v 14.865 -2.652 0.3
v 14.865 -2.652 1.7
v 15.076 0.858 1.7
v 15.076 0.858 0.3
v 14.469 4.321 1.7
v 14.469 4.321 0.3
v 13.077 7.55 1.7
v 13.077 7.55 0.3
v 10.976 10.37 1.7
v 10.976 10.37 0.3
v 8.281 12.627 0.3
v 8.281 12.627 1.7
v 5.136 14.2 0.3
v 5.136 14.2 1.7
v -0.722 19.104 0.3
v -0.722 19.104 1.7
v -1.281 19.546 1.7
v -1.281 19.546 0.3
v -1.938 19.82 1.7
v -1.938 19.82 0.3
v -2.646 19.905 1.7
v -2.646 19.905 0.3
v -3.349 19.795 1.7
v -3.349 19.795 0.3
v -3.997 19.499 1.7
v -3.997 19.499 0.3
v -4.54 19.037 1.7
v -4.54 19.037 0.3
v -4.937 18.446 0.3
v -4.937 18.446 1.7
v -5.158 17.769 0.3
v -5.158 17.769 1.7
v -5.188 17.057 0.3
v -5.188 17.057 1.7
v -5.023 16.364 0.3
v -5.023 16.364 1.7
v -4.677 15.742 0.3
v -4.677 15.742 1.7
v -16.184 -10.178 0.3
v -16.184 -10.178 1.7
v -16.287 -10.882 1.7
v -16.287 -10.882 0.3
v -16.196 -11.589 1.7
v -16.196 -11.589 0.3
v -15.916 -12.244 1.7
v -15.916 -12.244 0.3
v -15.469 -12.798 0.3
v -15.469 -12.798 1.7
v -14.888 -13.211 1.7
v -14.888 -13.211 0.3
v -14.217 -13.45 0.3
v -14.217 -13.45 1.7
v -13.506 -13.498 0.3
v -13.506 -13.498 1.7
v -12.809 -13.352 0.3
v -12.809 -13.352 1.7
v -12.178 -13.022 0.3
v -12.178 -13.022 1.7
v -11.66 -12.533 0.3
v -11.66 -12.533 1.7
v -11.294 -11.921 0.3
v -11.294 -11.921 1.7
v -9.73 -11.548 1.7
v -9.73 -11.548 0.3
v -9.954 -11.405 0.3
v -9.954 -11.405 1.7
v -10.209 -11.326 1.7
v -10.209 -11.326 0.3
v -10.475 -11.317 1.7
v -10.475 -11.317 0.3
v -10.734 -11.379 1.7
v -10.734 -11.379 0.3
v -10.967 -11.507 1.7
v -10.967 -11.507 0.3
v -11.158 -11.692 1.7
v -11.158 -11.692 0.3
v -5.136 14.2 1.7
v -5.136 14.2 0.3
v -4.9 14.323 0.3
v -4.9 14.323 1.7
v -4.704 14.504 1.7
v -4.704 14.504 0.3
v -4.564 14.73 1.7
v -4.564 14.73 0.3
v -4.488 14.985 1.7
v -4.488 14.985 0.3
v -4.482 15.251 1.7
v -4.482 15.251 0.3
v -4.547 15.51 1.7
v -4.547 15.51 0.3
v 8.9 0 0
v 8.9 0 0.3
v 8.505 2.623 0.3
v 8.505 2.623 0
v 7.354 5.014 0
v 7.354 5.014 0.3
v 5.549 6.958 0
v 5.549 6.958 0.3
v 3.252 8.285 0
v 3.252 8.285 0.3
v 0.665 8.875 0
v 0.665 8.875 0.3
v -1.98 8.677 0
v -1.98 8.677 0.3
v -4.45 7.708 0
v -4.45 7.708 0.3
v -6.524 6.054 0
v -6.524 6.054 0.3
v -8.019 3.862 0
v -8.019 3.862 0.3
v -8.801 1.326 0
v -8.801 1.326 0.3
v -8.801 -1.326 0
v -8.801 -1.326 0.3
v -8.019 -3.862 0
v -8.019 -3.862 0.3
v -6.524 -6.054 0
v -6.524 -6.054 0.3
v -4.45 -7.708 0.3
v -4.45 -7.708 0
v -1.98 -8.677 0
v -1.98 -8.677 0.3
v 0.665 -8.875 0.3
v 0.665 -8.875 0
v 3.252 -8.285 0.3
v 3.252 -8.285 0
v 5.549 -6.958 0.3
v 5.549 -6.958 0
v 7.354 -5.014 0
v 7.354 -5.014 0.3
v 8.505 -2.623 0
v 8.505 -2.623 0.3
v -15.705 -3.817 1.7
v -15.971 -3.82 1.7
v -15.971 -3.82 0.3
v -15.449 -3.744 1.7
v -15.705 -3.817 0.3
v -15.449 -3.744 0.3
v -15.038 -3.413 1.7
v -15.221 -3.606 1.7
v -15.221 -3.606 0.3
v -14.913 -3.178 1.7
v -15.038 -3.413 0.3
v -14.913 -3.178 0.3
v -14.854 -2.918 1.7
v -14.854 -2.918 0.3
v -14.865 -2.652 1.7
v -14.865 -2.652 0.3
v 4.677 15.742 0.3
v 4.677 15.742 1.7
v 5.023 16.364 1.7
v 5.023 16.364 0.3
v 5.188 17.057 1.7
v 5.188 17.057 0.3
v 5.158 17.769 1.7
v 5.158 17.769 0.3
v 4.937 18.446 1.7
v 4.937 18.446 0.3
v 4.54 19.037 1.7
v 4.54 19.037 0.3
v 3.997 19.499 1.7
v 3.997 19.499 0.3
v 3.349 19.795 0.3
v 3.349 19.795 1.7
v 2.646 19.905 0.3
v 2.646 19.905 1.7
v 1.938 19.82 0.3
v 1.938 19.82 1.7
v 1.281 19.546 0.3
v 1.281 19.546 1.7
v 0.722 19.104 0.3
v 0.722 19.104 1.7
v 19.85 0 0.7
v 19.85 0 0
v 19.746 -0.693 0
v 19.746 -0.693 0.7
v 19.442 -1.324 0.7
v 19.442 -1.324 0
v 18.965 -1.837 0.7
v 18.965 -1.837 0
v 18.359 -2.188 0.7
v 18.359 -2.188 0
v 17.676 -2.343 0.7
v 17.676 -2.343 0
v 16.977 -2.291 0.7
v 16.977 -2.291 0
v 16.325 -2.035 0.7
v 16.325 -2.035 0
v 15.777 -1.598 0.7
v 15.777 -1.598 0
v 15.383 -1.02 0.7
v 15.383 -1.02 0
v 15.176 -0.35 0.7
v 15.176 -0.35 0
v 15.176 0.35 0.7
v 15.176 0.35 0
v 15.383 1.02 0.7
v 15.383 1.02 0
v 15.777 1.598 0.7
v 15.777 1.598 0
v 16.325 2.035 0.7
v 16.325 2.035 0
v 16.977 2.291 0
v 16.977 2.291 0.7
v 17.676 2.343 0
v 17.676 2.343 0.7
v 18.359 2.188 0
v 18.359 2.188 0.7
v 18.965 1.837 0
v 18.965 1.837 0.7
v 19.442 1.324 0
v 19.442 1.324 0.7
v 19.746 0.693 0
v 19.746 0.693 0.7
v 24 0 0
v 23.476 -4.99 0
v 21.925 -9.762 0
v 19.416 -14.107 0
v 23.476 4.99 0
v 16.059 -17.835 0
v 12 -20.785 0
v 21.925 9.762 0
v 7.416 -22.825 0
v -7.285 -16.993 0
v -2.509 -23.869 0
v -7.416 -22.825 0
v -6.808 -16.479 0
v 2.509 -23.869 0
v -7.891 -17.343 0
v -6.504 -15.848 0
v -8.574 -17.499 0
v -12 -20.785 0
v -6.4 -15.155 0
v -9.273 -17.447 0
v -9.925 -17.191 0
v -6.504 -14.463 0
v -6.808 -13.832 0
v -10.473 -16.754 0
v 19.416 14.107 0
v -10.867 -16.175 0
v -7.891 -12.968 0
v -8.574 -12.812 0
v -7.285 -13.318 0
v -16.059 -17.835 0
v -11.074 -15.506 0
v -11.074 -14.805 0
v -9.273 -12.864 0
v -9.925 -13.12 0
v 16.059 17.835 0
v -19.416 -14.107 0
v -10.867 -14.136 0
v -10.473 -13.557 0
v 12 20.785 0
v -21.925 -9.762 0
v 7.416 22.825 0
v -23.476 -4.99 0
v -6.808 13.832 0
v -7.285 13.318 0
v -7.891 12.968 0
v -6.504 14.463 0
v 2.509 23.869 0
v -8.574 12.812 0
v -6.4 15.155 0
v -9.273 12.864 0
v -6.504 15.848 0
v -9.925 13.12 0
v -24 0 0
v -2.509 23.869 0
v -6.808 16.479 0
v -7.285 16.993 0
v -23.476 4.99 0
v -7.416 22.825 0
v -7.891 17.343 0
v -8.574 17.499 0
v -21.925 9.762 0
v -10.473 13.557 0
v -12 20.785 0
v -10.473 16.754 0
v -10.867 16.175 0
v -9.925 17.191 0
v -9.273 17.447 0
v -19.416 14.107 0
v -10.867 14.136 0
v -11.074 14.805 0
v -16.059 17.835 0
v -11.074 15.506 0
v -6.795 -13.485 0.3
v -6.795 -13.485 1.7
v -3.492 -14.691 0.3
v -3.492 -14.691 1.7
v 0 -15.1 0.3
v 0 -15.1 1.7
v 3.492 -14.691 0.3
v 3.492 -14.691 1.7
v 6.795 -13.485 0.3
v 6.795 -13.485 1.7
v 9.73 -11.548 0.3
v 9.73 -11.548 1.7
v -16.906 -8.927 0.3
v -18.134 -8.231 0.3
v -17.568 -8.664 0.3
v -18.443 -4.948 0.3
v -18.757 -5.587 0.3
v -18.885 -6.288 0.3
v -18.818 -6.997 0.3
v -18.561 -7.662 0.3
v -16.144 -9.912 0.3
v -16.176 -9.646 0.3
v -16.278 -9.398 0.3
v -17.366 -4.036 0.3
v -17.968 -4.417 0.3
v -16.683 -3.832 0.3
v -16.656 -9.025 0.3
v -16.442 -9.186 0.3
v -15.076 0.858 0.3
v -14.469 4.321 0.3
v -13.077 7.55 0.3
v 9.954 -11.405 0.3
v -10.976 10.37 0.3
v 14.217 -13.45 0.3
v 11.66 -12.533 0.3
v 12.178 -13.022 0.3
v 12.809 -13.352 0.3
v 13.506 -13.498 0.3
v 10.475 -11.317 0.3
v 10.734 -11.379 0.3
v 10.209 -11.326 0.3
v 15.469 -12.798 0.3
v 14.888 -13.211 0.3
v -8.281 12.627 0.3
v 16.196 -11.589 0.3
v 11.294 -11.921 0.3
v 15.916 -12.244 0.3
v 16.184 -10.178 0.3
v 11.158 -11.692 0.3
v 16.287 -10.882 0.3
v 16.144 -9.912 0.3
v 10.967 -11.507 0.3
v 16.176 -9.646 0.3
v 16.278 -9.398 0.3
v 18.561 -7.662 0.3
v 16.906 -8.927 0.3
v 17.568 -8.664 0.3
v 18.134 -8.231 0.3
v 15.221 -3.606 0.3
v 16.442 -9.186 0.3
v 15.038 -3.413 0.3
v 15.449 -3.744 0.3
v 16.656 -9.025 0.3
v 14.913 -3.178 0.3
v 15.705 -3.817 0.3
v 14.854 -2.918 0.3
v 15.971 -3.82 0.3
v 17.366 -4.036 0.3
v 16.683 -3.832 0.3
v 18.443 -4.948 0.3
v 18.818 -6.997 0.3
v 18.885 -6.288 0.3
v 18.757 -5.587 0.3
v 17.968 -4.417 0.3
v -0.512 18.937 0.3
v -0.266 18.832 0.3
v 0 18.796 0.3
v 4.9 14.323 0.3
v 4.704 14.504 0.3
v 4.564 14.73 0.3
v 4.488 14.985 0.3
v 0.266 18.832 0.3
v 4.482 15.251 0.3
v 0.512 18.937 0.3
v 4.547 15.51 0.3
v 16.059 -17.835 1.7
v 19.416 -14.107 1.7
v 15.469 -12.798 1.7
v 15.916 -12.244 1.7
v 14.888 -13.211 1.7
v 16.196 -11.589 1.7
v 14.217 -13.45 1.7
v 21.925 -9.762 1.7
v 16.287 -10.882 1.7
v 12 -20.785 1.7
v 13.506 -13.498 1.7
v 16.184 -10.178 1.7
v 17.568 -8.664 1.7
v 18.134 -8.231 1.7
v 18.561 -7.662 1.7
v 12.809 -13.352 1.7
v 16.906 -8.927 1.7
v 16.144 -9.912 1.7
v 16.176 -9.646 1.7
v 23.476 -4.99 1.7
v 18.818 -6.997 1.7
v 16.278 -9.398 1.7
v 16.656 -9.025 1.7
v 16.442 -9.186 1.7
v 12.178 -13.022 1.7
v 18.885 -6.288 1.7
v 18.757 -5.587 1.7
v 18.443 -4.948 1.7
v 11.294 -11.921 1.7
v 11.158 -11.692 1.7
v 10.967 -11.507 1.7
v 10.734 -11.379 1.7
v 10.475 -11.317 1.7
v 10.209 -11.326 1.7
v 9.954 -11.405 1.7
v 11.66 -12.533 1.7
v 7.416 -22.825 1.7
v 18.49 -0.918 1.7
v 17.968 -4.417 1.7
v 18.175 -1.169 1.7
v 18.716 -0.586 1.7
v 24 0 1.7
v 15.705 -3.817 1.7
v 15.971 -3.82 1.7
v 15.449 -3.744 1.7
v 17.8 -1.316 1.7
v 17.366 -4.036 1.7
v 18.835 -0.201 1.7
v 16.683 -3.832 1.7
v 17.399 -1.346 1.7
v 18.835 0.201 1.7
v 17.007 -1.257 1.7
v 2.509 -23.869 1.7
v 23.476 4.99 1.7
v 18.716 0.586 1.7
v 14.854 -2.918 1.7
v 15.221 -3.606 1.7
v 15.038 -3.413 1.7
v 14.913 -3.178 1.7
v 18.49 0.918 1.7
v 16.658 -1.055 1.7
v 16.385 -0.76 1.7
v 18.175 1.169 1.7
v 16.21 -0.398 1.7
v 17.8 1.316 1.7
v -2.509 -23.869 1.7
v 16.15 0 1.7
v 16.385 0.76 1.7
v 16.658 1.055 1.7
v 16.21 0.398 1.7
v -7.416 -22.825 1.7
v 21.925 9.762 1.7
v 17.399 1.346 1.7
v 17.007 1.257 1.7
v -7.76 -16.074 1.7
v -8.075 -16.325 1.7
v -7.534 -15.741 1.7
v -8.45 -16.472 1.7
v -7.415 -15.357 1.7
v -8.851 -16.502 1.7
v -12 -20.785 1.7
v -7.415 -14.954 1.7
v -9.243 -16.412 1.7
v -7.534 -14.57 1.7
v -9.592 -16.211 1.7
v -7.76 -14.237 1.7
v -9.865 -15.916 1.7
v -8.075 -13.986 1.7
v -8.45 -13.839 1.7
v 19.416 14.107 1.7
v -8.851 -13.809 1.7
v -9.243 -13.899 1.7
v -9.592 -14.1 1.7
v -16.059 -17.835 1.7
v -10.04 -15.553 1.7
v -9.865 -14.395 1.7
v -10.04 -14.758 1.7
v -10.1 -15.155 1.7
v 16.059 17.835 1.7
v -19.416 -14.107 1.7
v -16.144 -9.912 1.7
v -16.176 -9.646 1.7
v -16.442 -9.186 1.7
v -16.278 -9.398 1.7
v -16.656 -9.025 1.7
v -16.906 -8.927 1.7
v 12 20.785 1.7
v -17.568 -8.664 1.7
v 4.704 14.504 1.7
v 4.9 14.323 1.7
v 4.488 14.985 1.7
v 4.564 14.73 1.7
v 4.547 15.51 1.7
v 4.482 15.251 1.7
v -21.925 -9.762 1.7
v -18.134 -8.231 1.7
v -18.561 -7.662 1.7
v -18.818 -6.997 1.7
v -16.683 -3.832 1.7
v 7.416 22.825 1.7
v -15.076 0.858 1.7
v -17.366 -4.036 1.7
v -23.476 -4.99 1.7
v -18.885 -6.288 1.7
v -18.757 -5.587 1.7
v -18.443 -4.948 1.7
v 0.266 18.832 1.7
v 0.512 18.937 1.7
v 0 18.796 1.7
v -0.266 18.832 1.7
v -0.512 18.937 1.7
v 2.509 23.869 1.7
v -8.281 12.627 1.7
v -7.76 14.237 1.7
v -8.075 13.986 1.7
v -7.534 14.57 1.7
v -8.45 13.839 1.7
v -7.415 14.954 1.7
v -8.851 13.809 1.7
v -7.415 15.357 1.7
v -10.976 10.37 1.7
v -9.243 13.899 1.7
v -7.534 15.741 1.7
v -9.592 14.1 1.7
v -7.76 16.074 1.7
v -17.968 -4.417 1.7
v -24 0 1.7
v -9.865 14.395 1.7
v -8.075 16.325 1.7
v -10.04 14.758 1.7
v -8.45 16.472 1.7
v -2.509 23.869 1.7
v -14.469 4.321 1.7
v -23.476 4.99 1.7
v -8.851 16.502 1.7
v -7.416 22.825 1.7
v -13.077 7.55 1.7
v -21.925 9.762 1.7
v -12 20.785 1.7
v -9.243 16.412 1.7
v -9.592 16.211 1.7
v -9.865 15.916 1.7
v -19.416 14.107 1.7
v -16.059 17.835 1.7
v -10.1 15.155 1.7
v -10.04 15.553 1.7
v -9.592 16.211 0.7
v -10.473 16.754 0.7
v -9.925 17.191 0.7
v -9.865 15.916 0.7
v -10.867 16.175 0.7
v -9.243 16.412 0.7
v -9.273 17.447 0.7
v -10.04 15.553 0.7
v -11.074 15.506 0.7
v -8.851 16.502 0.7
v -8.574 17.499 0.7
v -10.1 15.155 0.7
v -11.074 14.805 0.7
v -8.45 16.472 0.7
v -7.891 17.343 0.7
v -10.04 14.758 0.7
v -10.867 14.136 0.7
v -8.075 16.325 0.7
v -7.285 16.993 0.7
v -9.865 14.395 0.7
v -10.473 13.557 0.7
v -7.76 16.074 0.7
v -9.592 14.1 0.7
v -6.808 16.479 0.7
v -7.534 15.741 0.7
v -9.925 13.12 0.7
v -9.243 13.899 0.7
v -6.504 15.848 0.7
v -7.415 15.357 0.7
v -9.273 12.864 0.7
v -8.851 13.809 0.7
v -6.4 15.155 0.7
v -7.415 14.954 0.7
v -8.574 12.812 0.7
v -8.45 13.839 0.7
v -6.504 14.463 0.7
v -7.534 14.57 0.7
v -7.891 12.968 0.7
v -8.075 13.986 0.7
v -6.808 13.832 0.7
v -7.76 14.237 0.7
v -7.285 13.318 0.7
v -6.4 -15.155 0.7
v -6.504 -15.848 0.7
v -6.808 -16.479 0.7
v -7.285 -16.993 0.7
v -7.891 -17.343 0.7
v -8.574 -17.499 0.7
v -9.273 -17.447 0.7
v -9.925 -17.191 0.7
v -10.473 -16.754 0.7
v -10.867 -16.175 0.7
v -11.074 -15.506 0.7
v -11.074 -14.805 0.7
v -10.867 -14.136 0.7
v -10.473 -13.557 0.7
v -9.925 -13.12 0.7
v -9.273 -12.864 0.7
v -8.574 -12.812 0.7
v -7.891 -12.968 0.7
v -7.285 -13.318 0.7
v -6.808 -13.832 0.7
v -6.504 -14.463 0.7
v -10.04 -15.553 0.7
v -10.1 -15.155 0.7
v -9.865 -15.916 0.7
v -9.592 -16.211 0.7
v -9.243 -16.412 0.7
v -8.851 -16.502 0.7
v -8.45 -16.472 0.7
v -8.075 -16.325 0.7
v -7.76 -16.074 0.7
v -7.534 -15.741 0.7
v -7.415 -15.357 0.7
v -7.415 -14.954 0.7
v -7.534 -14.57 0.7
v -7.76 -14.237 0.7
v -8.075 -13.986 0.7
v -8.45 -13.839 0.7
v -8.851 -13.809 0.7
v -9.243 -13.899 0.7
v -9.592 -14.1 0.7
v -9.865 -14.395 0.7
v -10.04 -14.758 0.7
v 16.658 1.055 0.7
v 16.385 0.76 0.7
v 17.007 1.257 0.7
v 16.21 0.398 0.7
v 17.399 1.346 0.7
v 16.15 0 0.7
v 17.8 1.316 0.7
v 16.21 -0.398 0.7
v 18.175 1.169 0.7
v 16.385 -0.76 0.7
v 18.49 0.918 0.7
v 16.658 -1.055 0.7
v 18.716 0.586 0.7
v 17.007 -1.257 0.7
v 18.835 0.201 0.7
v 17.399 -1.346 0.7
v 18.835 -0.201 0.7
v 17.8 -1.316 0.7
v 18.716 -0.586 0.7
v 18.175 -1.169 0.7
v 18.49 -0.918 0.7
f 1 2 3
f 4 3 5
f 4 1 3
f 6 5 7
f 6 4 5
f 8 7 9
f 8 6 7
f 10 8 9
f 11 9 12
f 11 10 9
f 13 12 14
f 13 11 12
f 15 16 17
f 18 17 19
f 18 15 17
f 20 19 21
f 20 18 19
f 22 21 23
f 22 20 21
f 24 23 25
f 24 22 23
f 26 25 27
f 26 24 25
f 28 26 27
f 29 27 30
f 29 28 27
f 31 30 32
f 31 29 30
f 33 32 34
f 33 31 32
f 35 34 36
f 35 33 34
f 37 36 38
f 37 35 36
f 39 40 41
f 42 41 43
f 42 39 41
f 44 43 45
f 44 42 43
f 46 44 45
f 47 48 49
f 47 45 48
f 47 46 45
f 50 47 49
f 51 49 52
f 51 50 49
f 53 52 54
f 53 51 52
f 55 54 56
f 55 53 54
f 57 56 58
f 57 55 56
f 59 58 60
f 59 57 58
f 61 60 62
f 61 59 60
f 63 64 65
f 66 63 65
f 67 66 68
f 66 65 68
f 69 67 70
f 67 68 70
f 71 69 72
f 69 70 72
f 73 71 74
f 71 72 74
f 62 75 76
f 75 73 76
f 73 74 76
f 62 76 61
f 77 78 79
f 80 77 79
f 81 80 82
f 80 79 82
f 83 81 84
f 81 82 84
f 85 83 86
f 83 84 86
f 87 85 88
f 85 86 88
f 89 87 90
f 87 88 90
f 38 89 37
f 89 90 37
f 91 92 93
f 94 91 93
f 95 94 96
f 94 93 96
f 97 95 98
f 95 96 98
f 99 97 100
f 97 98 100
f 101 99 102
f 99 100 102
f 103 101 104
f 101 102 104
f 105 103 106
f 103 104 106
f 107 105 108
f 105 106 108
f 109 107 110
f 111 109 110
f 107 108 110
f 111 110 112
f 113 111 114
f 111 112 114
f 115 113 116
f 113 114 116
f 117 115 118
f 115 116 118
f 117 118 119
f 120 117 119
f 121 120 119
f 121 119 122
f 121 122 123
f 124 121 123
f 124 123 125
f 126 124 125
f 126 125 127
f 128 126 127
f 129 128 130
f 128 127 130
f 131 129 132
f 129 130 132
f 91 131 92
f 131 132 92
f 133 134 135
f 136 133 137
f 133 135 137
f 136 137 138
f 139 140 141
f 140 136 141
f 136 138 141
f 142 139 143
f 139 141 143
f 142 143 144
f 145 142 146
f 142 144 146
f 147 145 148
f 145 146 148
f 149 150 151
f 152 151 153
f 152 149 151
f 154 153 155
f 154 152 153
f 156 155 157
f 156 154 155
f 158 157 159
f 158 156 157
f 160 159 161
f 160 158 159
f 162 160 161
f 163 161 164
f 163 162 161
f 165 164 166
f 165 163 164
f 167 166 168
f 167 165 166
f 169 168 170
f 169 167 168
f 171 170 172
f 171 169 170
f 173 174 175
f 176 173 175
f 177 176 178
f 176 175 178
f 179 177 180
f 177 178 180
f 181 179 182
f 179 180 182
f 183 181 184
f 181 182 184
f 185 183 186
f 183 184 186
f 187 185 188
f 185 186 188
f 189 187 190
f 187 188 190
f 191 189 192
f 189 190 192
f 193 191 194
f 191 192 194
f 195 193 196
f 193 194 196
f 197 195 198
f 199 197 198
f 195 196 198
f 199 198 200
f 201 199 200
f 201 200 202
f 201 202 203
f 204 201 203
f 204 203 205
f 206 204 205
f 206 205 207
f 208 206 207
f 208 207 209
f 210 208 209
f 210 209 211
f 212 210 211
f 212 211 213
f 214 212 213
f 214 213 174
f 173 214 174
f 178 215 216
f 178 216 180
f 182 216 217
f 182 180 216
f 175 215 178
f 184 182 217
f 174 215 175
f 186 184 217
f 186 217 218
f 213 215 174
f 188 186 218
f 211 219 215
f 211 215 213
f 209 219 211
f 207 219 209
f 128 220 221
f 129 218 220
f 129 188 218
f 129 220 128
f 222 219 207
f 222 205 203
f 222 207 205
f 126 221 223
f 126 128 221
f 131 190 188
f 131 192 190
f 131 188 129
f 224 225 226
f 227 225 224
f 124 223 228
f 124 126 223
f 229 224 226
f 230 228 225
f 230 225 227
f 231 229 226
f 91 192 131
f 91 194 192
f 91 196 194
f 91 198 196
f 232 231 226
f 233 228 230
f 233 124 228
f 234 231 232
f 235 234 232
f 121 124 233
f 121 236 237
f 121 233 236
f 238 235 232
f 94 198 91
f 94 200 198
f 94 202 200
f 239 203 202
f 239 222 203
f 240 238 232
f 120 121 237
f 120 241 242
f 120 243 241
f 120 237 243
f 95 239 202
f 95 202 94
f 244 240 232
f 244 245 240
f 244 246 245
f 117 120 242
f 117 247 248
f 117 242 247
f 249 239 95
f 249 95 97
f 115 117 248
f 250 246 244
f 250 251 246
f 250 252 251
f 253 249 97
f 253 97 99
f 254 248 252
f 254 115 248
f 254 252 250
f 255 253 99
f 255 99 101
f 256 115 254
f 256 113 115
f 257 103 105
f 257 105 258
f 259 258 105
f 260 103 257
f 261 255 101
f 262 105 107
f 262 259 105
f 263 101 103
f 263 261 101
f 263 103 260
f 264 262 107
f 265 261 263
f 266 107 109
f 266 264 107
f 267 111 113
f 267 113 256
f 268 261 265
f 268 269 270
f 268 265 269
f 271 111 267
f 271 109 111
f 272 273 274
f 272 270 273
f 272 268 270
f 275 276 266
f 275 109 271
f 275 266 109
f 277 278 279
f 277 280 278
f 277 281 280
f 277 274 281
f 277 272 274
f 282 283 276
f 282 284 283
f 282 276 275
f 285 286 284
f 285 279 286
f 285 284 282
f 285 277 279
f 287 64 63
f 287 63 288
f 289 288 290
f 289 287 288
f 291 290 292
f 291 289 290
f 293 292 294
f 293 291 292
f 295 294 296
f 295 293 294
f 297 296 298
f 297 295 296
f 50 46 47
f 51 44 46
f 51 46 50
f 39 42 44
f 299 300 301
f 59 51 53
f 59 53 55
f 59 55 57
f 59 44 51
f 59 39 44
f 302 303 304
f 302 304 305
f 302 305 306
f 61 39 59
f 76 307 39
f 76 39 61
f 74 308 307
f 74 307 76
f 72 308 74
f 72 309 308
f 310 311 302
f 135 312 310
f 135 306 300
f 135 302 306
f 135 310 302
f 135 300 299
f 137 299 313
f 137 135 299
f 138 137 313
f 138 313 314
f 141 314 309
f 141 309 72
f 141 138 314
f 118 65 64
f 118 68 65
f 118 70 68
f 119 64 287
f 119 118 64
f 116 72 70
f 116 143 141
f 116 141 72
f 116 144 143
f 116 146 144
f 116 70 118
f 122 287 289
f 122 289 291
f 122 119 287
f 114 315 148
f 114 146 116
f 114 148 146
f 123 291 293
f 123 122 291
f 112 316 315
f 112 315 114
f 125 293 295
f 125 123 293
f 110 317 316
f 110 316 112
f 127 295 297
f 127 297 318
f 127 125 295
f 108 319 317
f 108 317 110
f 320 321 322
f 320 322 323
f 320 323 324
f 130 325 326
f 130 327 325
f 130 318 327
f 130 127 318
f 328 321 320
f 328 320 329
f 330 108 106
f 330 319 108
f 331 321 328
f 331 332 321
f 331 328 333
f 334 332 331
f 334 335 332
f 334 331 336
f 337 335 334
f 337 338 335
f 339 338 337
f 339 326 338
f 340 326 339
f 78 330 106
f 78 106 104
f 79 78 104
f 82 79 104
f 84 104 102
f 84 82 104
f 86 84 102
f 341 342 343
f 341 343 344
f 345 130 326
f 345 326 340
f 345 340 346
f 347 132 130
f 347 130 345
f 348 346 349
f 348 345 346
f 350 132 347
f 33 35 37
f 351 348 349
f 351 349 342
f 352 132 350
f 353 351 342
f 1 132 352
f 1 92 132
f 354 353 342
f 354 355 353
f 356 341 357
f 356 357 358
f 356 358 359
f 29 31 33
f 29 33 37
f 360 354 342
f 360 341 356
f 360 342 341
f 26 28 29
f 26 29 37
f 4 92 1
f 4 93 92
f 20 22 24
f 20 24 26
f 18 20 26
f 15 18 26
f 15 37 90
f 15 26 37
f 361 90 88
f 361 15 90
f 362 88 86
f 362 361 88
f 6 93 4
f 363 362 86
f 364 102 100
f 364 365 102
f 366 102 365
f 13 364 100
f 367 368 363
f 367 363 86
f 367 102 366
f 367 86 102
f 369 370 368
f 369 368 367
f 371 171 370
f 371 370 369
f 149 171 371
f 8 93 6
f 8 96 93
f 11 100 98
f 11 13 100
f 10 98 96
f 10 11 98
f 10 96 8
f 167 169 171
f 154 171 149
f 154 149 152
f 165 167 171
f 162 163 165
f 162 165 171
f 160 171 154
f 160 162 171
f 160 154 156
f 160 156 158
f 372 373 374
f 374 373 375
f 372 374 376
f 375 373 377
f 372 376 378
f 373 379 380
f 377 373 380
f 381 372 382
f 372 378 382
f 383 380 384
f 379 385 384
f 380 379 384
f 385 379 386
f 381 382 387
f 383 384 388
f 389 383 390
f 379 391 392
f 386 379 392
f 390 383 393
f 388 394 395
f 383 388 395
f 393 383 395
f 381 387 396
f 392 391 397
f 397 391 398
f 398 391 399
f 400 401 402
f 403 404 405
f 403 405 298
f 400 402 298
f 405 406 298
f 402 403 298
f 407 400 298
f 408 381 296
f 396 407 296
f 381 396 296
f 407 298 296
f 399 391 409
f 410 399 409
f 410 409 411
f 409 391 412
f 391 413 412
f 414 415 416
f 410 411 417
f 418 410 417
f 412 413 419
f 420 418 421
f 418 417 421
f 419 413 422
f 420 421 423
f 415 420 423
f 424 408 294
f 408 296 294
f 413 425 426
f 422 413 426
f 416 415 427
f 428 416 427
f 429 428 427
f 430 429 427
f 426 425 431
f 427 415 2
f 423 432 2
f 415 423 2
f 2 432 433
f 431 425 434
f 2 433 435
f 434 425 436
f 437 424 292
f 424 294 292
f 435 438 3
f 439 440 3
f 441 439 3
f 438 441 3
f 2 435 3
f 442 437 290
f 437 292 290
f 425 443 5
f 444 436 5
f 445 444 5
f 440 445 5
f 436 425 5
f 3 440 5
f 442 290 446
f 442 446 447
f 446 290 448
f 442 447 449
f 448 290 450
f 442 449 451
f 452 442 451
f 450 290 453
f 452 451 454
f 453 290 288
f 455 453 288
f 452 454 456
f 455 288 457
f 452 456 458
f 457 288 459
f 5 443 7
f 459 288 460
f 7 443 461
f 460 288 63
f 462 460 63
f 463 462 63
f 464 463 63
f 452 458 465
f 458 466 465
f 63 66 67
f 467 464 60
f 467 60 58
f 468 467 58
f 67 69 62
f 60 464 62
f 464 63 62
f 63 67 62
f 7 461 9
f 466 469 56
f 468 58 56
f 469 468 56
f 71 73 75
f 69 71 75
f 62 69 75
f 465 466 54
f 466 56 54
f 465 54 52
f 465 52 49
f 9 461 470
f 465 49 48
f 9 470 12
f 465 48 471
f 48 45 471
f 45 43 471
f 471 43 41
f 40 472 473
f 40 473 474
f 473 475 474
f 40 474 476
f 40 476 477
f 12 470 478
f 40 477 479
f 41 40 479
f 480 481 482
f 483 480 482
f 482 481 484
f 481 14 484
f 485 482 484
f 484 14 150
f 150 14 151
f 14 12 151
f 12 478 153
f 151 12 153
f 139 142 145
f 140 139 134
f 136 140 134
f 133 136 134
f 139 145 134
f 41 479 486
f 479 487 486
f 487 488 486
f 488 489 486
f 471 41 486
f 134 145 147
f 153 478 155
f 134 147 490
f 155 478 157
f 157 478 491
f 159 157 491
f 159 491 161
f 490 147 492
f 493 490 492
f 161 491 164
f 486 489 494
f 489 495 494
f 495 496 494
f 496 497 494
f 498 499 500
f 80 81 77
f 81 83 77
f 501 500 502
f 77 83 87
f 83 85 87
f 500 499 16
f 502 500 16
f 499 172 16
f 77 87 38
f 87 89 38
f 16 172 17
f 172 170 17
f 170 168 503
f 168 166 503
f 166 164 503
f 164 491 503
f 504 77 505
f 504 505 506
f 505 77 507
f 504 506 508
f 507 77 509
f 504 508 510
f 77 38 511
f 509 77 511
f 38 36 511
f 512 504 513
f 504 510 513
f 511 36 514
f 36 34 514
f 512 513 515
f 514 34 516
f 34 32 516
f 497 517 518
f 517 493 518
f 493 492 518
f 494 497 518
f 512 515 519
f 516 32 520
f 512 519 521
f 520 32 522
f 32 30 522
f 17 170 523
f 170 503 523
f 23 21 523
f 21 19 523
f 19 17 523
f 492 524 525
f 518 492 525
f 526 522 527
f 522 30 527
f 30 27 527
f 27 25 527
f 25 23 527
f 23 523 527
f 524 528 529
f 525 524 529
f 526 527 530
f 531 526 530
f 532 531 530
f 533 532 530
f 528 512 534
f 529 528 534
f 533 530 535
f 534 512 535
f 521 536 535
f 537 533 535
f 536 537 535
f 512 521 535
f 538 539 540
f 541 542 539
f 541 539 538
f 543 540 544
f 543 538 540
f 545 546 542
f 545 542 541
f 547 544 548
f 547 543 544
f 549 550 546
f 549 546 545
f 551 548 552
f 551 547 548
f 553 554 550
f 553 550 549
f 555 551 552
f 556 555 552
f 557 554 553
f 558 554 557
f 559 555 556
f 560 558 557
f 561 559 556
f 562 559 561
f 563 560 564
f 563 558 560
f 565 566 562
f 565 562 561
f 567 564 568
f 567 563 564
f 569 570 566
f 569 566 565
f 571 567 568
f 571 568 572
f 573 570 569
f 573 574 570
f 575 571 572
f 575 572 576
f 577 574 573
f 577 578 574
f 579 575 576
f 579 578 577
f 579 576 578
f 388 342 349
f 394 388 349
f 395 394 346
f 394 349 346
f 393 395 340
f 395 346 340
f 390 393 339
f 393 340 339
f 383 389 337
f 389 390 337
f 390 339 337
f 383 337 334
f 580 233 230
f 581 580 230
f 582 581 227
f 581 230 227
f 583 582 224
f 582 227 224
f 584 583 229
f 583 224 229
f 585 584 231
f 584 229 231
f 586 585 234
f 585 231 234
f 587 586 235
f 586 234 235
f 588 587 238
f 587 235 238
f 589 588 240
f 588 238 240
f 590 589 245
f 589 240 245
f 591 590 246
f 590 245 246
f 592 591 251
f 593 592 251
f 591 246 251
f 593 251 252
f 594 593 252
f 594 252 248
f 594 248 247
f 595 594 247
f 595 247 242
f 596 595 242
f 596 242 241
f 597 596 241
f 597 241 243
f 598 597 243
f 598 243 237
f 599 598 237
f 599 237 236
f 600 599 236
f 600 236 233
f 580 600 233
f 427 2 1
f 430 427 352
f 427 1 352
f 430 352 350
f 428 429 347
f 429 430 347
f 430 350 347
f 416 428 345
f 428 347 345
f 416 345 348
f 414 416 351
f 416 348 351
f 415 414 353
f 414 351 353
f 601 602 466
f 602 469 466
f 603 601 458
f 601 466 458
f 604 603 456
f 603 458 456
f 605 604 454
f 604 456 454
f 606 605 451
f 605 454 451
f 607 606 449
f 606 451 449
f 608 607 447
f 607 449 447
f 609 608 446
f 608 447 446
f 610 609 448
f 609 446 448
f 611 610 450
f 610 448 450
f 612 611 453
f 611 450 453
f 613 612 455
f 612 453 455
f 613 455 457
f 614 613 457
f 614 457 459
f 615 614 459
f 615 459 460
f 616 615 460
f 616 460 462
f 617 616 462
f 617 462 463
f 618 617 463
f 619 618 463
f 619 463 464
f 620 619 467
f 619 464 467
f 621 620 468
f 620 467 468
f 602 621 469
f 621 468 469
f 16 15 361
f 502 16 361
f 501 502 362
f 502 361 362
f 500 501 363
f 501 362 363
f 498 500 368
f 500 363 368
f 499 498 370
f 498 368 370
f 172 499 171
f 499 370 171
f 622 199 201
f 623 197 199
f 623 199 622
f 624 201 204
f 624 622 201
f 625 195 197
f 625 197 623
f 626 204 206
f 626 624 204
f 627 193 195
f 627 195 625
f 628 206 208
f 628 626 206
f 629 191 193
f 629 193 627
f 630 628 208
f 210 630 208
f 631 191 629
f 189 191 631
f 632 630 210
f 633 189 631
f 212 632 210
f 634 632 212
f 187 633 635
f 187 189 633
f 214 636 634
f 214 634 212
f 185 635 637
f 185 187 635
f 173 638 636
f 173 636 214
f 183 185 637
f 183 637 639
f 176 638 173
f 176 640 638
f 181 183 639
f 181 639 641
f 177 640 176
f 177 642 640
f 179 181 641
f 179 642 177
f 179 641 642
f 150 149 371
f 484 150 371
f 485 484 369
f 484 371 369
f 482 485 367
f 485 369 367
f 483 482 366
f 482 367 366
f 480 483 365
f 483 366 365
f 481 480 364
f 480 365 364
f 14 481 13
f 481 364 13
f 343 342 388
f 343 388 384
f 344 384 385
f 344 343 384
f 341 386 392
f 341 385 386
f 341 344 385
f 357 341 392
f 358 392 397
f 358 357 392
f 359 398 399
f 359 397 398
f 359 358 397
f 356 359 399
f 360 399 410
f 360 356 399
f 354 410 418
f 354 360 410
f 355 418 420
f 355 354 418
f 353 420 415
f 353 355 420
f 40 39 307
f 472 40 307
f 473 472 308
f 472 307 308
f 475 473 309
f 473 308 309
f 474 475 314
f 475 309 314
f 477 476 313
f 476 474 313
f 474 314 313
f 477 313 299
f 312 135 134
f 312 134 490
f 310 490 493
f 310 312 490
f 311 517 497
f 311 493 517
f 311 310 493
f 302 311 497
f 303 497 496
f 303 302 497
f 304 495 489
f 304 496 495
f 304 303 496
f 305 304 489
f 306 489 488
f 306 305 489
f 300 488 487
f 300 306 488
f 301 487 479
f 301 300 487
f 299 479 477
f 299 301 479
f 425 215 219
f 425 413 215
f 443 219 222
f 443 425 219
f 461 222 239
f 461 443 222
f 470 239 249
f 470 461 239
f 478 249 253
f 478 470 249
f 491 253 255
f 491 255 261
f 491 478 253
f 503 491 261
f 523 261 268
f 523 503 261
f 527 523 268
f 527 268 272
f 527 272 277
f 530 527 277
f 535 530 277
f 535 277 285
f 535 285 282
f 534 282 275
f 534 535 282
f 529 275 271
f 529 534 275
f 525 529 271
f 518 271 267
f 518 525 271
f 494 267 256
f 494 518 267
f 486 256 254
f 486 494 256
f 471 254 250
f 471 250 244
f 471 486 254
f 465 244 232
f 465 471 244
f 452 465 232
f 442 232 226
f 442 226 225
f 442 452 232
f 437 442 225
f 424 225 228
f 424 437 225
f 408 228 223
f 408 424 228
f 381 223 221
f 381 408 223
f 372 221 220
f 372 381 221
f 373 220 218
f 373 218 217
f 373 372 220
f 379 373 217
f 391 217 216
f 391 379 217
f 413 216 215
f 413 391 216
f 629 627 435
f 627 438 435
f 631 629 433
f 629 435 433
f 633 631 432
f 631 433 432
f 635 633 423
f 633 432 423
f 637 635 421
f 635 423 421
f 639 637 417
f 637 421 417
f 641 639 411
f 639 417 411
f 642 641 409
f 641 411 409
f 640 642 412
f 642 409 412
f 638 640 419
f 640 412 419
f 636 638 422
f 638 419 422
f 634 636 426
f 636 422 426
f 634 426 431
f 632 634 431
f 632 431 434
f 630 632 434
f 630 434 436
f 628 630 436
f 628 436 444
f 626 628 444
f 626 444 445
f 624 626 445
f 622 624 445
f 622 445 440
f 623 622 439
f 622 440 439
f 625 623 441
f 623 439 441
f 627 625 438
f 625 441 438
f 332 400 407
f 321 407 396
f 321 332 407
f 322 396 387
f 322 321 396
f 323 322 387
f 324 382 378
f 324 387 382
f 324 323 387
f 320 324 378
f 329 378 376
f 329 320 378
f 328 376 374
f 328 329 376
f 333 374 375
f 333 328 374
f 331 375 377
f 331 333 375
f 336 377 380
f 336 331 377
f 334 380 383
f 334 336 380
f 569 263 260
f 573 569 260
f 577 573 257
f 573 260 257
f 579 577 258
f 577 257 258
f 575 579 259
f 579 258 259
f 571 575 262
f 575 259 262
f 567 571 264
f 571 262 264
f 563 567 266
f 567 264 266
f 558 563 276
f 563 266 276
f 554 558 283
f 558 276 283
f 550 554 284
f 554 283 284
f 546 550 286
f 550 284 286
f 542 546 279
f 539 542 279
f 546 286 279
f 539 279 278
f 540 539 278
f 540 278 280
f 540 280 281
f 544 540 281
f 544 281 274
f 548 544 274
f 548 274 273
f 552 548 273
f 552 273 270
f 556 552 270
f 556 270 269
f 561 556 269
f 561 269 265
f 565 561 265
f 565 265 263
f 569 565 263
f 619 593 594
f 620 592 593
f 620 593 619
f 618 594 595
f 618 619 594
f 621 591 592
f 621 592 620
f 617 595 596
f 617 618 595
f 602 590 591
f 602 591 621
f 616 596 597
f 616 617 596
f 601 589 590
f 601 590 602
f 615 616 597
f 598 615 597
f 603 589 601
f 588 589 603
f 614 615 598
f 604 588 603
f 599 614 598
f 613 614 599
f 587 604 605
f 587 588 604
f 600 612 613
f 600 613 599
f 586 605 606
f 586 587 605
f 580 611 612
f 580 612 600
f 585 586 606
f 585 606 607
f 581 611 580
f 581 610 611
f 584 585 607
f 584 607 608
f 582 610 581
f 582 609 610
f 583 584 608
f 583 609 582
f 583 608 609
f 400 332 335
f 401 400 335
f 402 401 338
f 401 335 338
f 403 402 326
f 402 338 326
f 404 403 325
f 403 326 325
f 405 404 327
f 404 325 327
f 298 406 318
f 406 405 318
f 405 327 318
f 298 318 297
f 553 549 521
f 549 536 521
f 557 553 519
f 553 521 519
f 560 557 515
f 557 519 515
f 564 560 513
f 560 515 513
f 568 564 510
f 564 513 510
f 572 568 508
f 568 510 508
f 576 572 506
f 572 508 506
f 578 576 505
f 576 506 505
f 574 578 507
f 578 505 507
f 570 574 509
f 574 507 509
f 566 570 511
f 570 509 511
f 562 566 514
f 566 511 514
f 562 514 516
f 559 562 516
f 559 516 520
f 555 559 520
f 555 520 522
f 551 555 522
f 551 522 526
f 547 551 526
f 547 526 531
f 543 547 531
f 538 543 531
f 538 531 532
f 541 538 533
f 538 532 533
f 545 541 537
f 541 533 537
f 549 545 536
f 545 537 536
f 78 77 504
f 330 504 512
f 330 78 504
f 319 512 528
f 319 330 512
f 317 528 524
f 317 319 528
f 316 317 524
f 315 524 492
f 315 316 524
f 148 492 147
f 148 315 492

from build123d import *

# Parameters (mm, degrees)
SKETCH_W         = 15.1
SKETCH_H         = 1.7
POCKET_DEPTH     = 5.2
HOLE_D           = 2.7
HOLE_CBORE_D     = 4.7
HOLE_CBORE_DEPTH = 0.7


with BuildPart() as part:
    # Sketch → Revolution (revolve)
    with BuildSketch(Plane.XZ):
        with Locations((16.45, 0.85)):
            Rectangle(SKETCH_W, SKETCH_H)
    revolve(axis=Axis((0, 0, 0), (0, 0, 1)))

    # Sketch001 → Pocket (cut)
    with BuildSketch(Plane.XY.offset(0.3)):
        with BuildLine():
            ThreePointArc((-15.971238, -3.820499), (-18.844764, -5.933151), (-16.905745, -8.926586))
            ThreePointArc((-16.183523, -10.177512), (-16.277605, -9.39788), (-16.905745, -8.926586))
            ThreePointArc((-16.183523, -10.177512), (-14.560642, -13.353469), (-11.294268, -11.921249))
            ThreePointArc((-9.729552, -11.547546), (-10.60619, -11.33964), (-11.294268, -11.921249))
            ThreePointArc((-9.729552, -11.547546), (0, -15.1), (9.729552, -11.547546))
            ThreePointArc((11.294268, -11.921249), (10.60619, -11.33964), (9.729552, -11.547546))
            ThreePointArc((11.294268, -11.921249), (14.560642, -13.353469), (16.183523, -10.177512))
            ThreePointArc((16.905745, -8.926586), (16.277605, -9.39788), (16.183523, -10.177512))
            ThreePointArc((16.905745, -8.926586), (18.844764, -5.933151), (15.971238, -3.820499))
            ThreePointArc((14.865244, -2.652266), (15.123511, -3.51541), (15.971238, -3.820499))
            ThreePointArc((14.865244, -2.652266), (13.076984, 7.55), (5.135693, 14.199812))
            ThreePointArc((4.67697, 15.741748), (4.517321, 14.85505), (5.135693, 14.199812))
            ThreePointArc((4.67697, 15.741748), (4.284123, 19.28662), (0.722222, 19.104098))
            ThreePointArc((-0.722222, 19.104098), (0, 18.795759), (0.722222, 19.104098))
            ThreePointArc((-0.722222, 19.104098), (-4.284123, 19.28662), (-4.67697, 15.741748))
            ThreePointArc((-5.135693, 14.199812), (-4.517321, 14.85505), (-4.67697, 15.741748))
            ThreePointArc((-5.135693, 14.199812), (-13.076984, 7.55), (-14.865244, -2.652266))
            ThreePointArc((-15.971238, -3.820499), (-15.123511, -3.51541), (-14.865244, -2.652266))
        make_face()
    extrude(amount=POCKET_DEPTH, mode=Mode.SUBTRACT)

    # Hole (through all)
    with Locations(Plane(origin=(0, 0, 0), x_dir=(1, 0, 0), z_dir=(0, 0, -1))):
        with Locations((-8.75, -15.155445), (-8.75, 15.155445), (17.5, 0)):
            CounterBoreHole(HOLE_D / 2, HOLE_CBORE_D / 2, HOLE_CBORE_DEPTH)


solid = part.part
